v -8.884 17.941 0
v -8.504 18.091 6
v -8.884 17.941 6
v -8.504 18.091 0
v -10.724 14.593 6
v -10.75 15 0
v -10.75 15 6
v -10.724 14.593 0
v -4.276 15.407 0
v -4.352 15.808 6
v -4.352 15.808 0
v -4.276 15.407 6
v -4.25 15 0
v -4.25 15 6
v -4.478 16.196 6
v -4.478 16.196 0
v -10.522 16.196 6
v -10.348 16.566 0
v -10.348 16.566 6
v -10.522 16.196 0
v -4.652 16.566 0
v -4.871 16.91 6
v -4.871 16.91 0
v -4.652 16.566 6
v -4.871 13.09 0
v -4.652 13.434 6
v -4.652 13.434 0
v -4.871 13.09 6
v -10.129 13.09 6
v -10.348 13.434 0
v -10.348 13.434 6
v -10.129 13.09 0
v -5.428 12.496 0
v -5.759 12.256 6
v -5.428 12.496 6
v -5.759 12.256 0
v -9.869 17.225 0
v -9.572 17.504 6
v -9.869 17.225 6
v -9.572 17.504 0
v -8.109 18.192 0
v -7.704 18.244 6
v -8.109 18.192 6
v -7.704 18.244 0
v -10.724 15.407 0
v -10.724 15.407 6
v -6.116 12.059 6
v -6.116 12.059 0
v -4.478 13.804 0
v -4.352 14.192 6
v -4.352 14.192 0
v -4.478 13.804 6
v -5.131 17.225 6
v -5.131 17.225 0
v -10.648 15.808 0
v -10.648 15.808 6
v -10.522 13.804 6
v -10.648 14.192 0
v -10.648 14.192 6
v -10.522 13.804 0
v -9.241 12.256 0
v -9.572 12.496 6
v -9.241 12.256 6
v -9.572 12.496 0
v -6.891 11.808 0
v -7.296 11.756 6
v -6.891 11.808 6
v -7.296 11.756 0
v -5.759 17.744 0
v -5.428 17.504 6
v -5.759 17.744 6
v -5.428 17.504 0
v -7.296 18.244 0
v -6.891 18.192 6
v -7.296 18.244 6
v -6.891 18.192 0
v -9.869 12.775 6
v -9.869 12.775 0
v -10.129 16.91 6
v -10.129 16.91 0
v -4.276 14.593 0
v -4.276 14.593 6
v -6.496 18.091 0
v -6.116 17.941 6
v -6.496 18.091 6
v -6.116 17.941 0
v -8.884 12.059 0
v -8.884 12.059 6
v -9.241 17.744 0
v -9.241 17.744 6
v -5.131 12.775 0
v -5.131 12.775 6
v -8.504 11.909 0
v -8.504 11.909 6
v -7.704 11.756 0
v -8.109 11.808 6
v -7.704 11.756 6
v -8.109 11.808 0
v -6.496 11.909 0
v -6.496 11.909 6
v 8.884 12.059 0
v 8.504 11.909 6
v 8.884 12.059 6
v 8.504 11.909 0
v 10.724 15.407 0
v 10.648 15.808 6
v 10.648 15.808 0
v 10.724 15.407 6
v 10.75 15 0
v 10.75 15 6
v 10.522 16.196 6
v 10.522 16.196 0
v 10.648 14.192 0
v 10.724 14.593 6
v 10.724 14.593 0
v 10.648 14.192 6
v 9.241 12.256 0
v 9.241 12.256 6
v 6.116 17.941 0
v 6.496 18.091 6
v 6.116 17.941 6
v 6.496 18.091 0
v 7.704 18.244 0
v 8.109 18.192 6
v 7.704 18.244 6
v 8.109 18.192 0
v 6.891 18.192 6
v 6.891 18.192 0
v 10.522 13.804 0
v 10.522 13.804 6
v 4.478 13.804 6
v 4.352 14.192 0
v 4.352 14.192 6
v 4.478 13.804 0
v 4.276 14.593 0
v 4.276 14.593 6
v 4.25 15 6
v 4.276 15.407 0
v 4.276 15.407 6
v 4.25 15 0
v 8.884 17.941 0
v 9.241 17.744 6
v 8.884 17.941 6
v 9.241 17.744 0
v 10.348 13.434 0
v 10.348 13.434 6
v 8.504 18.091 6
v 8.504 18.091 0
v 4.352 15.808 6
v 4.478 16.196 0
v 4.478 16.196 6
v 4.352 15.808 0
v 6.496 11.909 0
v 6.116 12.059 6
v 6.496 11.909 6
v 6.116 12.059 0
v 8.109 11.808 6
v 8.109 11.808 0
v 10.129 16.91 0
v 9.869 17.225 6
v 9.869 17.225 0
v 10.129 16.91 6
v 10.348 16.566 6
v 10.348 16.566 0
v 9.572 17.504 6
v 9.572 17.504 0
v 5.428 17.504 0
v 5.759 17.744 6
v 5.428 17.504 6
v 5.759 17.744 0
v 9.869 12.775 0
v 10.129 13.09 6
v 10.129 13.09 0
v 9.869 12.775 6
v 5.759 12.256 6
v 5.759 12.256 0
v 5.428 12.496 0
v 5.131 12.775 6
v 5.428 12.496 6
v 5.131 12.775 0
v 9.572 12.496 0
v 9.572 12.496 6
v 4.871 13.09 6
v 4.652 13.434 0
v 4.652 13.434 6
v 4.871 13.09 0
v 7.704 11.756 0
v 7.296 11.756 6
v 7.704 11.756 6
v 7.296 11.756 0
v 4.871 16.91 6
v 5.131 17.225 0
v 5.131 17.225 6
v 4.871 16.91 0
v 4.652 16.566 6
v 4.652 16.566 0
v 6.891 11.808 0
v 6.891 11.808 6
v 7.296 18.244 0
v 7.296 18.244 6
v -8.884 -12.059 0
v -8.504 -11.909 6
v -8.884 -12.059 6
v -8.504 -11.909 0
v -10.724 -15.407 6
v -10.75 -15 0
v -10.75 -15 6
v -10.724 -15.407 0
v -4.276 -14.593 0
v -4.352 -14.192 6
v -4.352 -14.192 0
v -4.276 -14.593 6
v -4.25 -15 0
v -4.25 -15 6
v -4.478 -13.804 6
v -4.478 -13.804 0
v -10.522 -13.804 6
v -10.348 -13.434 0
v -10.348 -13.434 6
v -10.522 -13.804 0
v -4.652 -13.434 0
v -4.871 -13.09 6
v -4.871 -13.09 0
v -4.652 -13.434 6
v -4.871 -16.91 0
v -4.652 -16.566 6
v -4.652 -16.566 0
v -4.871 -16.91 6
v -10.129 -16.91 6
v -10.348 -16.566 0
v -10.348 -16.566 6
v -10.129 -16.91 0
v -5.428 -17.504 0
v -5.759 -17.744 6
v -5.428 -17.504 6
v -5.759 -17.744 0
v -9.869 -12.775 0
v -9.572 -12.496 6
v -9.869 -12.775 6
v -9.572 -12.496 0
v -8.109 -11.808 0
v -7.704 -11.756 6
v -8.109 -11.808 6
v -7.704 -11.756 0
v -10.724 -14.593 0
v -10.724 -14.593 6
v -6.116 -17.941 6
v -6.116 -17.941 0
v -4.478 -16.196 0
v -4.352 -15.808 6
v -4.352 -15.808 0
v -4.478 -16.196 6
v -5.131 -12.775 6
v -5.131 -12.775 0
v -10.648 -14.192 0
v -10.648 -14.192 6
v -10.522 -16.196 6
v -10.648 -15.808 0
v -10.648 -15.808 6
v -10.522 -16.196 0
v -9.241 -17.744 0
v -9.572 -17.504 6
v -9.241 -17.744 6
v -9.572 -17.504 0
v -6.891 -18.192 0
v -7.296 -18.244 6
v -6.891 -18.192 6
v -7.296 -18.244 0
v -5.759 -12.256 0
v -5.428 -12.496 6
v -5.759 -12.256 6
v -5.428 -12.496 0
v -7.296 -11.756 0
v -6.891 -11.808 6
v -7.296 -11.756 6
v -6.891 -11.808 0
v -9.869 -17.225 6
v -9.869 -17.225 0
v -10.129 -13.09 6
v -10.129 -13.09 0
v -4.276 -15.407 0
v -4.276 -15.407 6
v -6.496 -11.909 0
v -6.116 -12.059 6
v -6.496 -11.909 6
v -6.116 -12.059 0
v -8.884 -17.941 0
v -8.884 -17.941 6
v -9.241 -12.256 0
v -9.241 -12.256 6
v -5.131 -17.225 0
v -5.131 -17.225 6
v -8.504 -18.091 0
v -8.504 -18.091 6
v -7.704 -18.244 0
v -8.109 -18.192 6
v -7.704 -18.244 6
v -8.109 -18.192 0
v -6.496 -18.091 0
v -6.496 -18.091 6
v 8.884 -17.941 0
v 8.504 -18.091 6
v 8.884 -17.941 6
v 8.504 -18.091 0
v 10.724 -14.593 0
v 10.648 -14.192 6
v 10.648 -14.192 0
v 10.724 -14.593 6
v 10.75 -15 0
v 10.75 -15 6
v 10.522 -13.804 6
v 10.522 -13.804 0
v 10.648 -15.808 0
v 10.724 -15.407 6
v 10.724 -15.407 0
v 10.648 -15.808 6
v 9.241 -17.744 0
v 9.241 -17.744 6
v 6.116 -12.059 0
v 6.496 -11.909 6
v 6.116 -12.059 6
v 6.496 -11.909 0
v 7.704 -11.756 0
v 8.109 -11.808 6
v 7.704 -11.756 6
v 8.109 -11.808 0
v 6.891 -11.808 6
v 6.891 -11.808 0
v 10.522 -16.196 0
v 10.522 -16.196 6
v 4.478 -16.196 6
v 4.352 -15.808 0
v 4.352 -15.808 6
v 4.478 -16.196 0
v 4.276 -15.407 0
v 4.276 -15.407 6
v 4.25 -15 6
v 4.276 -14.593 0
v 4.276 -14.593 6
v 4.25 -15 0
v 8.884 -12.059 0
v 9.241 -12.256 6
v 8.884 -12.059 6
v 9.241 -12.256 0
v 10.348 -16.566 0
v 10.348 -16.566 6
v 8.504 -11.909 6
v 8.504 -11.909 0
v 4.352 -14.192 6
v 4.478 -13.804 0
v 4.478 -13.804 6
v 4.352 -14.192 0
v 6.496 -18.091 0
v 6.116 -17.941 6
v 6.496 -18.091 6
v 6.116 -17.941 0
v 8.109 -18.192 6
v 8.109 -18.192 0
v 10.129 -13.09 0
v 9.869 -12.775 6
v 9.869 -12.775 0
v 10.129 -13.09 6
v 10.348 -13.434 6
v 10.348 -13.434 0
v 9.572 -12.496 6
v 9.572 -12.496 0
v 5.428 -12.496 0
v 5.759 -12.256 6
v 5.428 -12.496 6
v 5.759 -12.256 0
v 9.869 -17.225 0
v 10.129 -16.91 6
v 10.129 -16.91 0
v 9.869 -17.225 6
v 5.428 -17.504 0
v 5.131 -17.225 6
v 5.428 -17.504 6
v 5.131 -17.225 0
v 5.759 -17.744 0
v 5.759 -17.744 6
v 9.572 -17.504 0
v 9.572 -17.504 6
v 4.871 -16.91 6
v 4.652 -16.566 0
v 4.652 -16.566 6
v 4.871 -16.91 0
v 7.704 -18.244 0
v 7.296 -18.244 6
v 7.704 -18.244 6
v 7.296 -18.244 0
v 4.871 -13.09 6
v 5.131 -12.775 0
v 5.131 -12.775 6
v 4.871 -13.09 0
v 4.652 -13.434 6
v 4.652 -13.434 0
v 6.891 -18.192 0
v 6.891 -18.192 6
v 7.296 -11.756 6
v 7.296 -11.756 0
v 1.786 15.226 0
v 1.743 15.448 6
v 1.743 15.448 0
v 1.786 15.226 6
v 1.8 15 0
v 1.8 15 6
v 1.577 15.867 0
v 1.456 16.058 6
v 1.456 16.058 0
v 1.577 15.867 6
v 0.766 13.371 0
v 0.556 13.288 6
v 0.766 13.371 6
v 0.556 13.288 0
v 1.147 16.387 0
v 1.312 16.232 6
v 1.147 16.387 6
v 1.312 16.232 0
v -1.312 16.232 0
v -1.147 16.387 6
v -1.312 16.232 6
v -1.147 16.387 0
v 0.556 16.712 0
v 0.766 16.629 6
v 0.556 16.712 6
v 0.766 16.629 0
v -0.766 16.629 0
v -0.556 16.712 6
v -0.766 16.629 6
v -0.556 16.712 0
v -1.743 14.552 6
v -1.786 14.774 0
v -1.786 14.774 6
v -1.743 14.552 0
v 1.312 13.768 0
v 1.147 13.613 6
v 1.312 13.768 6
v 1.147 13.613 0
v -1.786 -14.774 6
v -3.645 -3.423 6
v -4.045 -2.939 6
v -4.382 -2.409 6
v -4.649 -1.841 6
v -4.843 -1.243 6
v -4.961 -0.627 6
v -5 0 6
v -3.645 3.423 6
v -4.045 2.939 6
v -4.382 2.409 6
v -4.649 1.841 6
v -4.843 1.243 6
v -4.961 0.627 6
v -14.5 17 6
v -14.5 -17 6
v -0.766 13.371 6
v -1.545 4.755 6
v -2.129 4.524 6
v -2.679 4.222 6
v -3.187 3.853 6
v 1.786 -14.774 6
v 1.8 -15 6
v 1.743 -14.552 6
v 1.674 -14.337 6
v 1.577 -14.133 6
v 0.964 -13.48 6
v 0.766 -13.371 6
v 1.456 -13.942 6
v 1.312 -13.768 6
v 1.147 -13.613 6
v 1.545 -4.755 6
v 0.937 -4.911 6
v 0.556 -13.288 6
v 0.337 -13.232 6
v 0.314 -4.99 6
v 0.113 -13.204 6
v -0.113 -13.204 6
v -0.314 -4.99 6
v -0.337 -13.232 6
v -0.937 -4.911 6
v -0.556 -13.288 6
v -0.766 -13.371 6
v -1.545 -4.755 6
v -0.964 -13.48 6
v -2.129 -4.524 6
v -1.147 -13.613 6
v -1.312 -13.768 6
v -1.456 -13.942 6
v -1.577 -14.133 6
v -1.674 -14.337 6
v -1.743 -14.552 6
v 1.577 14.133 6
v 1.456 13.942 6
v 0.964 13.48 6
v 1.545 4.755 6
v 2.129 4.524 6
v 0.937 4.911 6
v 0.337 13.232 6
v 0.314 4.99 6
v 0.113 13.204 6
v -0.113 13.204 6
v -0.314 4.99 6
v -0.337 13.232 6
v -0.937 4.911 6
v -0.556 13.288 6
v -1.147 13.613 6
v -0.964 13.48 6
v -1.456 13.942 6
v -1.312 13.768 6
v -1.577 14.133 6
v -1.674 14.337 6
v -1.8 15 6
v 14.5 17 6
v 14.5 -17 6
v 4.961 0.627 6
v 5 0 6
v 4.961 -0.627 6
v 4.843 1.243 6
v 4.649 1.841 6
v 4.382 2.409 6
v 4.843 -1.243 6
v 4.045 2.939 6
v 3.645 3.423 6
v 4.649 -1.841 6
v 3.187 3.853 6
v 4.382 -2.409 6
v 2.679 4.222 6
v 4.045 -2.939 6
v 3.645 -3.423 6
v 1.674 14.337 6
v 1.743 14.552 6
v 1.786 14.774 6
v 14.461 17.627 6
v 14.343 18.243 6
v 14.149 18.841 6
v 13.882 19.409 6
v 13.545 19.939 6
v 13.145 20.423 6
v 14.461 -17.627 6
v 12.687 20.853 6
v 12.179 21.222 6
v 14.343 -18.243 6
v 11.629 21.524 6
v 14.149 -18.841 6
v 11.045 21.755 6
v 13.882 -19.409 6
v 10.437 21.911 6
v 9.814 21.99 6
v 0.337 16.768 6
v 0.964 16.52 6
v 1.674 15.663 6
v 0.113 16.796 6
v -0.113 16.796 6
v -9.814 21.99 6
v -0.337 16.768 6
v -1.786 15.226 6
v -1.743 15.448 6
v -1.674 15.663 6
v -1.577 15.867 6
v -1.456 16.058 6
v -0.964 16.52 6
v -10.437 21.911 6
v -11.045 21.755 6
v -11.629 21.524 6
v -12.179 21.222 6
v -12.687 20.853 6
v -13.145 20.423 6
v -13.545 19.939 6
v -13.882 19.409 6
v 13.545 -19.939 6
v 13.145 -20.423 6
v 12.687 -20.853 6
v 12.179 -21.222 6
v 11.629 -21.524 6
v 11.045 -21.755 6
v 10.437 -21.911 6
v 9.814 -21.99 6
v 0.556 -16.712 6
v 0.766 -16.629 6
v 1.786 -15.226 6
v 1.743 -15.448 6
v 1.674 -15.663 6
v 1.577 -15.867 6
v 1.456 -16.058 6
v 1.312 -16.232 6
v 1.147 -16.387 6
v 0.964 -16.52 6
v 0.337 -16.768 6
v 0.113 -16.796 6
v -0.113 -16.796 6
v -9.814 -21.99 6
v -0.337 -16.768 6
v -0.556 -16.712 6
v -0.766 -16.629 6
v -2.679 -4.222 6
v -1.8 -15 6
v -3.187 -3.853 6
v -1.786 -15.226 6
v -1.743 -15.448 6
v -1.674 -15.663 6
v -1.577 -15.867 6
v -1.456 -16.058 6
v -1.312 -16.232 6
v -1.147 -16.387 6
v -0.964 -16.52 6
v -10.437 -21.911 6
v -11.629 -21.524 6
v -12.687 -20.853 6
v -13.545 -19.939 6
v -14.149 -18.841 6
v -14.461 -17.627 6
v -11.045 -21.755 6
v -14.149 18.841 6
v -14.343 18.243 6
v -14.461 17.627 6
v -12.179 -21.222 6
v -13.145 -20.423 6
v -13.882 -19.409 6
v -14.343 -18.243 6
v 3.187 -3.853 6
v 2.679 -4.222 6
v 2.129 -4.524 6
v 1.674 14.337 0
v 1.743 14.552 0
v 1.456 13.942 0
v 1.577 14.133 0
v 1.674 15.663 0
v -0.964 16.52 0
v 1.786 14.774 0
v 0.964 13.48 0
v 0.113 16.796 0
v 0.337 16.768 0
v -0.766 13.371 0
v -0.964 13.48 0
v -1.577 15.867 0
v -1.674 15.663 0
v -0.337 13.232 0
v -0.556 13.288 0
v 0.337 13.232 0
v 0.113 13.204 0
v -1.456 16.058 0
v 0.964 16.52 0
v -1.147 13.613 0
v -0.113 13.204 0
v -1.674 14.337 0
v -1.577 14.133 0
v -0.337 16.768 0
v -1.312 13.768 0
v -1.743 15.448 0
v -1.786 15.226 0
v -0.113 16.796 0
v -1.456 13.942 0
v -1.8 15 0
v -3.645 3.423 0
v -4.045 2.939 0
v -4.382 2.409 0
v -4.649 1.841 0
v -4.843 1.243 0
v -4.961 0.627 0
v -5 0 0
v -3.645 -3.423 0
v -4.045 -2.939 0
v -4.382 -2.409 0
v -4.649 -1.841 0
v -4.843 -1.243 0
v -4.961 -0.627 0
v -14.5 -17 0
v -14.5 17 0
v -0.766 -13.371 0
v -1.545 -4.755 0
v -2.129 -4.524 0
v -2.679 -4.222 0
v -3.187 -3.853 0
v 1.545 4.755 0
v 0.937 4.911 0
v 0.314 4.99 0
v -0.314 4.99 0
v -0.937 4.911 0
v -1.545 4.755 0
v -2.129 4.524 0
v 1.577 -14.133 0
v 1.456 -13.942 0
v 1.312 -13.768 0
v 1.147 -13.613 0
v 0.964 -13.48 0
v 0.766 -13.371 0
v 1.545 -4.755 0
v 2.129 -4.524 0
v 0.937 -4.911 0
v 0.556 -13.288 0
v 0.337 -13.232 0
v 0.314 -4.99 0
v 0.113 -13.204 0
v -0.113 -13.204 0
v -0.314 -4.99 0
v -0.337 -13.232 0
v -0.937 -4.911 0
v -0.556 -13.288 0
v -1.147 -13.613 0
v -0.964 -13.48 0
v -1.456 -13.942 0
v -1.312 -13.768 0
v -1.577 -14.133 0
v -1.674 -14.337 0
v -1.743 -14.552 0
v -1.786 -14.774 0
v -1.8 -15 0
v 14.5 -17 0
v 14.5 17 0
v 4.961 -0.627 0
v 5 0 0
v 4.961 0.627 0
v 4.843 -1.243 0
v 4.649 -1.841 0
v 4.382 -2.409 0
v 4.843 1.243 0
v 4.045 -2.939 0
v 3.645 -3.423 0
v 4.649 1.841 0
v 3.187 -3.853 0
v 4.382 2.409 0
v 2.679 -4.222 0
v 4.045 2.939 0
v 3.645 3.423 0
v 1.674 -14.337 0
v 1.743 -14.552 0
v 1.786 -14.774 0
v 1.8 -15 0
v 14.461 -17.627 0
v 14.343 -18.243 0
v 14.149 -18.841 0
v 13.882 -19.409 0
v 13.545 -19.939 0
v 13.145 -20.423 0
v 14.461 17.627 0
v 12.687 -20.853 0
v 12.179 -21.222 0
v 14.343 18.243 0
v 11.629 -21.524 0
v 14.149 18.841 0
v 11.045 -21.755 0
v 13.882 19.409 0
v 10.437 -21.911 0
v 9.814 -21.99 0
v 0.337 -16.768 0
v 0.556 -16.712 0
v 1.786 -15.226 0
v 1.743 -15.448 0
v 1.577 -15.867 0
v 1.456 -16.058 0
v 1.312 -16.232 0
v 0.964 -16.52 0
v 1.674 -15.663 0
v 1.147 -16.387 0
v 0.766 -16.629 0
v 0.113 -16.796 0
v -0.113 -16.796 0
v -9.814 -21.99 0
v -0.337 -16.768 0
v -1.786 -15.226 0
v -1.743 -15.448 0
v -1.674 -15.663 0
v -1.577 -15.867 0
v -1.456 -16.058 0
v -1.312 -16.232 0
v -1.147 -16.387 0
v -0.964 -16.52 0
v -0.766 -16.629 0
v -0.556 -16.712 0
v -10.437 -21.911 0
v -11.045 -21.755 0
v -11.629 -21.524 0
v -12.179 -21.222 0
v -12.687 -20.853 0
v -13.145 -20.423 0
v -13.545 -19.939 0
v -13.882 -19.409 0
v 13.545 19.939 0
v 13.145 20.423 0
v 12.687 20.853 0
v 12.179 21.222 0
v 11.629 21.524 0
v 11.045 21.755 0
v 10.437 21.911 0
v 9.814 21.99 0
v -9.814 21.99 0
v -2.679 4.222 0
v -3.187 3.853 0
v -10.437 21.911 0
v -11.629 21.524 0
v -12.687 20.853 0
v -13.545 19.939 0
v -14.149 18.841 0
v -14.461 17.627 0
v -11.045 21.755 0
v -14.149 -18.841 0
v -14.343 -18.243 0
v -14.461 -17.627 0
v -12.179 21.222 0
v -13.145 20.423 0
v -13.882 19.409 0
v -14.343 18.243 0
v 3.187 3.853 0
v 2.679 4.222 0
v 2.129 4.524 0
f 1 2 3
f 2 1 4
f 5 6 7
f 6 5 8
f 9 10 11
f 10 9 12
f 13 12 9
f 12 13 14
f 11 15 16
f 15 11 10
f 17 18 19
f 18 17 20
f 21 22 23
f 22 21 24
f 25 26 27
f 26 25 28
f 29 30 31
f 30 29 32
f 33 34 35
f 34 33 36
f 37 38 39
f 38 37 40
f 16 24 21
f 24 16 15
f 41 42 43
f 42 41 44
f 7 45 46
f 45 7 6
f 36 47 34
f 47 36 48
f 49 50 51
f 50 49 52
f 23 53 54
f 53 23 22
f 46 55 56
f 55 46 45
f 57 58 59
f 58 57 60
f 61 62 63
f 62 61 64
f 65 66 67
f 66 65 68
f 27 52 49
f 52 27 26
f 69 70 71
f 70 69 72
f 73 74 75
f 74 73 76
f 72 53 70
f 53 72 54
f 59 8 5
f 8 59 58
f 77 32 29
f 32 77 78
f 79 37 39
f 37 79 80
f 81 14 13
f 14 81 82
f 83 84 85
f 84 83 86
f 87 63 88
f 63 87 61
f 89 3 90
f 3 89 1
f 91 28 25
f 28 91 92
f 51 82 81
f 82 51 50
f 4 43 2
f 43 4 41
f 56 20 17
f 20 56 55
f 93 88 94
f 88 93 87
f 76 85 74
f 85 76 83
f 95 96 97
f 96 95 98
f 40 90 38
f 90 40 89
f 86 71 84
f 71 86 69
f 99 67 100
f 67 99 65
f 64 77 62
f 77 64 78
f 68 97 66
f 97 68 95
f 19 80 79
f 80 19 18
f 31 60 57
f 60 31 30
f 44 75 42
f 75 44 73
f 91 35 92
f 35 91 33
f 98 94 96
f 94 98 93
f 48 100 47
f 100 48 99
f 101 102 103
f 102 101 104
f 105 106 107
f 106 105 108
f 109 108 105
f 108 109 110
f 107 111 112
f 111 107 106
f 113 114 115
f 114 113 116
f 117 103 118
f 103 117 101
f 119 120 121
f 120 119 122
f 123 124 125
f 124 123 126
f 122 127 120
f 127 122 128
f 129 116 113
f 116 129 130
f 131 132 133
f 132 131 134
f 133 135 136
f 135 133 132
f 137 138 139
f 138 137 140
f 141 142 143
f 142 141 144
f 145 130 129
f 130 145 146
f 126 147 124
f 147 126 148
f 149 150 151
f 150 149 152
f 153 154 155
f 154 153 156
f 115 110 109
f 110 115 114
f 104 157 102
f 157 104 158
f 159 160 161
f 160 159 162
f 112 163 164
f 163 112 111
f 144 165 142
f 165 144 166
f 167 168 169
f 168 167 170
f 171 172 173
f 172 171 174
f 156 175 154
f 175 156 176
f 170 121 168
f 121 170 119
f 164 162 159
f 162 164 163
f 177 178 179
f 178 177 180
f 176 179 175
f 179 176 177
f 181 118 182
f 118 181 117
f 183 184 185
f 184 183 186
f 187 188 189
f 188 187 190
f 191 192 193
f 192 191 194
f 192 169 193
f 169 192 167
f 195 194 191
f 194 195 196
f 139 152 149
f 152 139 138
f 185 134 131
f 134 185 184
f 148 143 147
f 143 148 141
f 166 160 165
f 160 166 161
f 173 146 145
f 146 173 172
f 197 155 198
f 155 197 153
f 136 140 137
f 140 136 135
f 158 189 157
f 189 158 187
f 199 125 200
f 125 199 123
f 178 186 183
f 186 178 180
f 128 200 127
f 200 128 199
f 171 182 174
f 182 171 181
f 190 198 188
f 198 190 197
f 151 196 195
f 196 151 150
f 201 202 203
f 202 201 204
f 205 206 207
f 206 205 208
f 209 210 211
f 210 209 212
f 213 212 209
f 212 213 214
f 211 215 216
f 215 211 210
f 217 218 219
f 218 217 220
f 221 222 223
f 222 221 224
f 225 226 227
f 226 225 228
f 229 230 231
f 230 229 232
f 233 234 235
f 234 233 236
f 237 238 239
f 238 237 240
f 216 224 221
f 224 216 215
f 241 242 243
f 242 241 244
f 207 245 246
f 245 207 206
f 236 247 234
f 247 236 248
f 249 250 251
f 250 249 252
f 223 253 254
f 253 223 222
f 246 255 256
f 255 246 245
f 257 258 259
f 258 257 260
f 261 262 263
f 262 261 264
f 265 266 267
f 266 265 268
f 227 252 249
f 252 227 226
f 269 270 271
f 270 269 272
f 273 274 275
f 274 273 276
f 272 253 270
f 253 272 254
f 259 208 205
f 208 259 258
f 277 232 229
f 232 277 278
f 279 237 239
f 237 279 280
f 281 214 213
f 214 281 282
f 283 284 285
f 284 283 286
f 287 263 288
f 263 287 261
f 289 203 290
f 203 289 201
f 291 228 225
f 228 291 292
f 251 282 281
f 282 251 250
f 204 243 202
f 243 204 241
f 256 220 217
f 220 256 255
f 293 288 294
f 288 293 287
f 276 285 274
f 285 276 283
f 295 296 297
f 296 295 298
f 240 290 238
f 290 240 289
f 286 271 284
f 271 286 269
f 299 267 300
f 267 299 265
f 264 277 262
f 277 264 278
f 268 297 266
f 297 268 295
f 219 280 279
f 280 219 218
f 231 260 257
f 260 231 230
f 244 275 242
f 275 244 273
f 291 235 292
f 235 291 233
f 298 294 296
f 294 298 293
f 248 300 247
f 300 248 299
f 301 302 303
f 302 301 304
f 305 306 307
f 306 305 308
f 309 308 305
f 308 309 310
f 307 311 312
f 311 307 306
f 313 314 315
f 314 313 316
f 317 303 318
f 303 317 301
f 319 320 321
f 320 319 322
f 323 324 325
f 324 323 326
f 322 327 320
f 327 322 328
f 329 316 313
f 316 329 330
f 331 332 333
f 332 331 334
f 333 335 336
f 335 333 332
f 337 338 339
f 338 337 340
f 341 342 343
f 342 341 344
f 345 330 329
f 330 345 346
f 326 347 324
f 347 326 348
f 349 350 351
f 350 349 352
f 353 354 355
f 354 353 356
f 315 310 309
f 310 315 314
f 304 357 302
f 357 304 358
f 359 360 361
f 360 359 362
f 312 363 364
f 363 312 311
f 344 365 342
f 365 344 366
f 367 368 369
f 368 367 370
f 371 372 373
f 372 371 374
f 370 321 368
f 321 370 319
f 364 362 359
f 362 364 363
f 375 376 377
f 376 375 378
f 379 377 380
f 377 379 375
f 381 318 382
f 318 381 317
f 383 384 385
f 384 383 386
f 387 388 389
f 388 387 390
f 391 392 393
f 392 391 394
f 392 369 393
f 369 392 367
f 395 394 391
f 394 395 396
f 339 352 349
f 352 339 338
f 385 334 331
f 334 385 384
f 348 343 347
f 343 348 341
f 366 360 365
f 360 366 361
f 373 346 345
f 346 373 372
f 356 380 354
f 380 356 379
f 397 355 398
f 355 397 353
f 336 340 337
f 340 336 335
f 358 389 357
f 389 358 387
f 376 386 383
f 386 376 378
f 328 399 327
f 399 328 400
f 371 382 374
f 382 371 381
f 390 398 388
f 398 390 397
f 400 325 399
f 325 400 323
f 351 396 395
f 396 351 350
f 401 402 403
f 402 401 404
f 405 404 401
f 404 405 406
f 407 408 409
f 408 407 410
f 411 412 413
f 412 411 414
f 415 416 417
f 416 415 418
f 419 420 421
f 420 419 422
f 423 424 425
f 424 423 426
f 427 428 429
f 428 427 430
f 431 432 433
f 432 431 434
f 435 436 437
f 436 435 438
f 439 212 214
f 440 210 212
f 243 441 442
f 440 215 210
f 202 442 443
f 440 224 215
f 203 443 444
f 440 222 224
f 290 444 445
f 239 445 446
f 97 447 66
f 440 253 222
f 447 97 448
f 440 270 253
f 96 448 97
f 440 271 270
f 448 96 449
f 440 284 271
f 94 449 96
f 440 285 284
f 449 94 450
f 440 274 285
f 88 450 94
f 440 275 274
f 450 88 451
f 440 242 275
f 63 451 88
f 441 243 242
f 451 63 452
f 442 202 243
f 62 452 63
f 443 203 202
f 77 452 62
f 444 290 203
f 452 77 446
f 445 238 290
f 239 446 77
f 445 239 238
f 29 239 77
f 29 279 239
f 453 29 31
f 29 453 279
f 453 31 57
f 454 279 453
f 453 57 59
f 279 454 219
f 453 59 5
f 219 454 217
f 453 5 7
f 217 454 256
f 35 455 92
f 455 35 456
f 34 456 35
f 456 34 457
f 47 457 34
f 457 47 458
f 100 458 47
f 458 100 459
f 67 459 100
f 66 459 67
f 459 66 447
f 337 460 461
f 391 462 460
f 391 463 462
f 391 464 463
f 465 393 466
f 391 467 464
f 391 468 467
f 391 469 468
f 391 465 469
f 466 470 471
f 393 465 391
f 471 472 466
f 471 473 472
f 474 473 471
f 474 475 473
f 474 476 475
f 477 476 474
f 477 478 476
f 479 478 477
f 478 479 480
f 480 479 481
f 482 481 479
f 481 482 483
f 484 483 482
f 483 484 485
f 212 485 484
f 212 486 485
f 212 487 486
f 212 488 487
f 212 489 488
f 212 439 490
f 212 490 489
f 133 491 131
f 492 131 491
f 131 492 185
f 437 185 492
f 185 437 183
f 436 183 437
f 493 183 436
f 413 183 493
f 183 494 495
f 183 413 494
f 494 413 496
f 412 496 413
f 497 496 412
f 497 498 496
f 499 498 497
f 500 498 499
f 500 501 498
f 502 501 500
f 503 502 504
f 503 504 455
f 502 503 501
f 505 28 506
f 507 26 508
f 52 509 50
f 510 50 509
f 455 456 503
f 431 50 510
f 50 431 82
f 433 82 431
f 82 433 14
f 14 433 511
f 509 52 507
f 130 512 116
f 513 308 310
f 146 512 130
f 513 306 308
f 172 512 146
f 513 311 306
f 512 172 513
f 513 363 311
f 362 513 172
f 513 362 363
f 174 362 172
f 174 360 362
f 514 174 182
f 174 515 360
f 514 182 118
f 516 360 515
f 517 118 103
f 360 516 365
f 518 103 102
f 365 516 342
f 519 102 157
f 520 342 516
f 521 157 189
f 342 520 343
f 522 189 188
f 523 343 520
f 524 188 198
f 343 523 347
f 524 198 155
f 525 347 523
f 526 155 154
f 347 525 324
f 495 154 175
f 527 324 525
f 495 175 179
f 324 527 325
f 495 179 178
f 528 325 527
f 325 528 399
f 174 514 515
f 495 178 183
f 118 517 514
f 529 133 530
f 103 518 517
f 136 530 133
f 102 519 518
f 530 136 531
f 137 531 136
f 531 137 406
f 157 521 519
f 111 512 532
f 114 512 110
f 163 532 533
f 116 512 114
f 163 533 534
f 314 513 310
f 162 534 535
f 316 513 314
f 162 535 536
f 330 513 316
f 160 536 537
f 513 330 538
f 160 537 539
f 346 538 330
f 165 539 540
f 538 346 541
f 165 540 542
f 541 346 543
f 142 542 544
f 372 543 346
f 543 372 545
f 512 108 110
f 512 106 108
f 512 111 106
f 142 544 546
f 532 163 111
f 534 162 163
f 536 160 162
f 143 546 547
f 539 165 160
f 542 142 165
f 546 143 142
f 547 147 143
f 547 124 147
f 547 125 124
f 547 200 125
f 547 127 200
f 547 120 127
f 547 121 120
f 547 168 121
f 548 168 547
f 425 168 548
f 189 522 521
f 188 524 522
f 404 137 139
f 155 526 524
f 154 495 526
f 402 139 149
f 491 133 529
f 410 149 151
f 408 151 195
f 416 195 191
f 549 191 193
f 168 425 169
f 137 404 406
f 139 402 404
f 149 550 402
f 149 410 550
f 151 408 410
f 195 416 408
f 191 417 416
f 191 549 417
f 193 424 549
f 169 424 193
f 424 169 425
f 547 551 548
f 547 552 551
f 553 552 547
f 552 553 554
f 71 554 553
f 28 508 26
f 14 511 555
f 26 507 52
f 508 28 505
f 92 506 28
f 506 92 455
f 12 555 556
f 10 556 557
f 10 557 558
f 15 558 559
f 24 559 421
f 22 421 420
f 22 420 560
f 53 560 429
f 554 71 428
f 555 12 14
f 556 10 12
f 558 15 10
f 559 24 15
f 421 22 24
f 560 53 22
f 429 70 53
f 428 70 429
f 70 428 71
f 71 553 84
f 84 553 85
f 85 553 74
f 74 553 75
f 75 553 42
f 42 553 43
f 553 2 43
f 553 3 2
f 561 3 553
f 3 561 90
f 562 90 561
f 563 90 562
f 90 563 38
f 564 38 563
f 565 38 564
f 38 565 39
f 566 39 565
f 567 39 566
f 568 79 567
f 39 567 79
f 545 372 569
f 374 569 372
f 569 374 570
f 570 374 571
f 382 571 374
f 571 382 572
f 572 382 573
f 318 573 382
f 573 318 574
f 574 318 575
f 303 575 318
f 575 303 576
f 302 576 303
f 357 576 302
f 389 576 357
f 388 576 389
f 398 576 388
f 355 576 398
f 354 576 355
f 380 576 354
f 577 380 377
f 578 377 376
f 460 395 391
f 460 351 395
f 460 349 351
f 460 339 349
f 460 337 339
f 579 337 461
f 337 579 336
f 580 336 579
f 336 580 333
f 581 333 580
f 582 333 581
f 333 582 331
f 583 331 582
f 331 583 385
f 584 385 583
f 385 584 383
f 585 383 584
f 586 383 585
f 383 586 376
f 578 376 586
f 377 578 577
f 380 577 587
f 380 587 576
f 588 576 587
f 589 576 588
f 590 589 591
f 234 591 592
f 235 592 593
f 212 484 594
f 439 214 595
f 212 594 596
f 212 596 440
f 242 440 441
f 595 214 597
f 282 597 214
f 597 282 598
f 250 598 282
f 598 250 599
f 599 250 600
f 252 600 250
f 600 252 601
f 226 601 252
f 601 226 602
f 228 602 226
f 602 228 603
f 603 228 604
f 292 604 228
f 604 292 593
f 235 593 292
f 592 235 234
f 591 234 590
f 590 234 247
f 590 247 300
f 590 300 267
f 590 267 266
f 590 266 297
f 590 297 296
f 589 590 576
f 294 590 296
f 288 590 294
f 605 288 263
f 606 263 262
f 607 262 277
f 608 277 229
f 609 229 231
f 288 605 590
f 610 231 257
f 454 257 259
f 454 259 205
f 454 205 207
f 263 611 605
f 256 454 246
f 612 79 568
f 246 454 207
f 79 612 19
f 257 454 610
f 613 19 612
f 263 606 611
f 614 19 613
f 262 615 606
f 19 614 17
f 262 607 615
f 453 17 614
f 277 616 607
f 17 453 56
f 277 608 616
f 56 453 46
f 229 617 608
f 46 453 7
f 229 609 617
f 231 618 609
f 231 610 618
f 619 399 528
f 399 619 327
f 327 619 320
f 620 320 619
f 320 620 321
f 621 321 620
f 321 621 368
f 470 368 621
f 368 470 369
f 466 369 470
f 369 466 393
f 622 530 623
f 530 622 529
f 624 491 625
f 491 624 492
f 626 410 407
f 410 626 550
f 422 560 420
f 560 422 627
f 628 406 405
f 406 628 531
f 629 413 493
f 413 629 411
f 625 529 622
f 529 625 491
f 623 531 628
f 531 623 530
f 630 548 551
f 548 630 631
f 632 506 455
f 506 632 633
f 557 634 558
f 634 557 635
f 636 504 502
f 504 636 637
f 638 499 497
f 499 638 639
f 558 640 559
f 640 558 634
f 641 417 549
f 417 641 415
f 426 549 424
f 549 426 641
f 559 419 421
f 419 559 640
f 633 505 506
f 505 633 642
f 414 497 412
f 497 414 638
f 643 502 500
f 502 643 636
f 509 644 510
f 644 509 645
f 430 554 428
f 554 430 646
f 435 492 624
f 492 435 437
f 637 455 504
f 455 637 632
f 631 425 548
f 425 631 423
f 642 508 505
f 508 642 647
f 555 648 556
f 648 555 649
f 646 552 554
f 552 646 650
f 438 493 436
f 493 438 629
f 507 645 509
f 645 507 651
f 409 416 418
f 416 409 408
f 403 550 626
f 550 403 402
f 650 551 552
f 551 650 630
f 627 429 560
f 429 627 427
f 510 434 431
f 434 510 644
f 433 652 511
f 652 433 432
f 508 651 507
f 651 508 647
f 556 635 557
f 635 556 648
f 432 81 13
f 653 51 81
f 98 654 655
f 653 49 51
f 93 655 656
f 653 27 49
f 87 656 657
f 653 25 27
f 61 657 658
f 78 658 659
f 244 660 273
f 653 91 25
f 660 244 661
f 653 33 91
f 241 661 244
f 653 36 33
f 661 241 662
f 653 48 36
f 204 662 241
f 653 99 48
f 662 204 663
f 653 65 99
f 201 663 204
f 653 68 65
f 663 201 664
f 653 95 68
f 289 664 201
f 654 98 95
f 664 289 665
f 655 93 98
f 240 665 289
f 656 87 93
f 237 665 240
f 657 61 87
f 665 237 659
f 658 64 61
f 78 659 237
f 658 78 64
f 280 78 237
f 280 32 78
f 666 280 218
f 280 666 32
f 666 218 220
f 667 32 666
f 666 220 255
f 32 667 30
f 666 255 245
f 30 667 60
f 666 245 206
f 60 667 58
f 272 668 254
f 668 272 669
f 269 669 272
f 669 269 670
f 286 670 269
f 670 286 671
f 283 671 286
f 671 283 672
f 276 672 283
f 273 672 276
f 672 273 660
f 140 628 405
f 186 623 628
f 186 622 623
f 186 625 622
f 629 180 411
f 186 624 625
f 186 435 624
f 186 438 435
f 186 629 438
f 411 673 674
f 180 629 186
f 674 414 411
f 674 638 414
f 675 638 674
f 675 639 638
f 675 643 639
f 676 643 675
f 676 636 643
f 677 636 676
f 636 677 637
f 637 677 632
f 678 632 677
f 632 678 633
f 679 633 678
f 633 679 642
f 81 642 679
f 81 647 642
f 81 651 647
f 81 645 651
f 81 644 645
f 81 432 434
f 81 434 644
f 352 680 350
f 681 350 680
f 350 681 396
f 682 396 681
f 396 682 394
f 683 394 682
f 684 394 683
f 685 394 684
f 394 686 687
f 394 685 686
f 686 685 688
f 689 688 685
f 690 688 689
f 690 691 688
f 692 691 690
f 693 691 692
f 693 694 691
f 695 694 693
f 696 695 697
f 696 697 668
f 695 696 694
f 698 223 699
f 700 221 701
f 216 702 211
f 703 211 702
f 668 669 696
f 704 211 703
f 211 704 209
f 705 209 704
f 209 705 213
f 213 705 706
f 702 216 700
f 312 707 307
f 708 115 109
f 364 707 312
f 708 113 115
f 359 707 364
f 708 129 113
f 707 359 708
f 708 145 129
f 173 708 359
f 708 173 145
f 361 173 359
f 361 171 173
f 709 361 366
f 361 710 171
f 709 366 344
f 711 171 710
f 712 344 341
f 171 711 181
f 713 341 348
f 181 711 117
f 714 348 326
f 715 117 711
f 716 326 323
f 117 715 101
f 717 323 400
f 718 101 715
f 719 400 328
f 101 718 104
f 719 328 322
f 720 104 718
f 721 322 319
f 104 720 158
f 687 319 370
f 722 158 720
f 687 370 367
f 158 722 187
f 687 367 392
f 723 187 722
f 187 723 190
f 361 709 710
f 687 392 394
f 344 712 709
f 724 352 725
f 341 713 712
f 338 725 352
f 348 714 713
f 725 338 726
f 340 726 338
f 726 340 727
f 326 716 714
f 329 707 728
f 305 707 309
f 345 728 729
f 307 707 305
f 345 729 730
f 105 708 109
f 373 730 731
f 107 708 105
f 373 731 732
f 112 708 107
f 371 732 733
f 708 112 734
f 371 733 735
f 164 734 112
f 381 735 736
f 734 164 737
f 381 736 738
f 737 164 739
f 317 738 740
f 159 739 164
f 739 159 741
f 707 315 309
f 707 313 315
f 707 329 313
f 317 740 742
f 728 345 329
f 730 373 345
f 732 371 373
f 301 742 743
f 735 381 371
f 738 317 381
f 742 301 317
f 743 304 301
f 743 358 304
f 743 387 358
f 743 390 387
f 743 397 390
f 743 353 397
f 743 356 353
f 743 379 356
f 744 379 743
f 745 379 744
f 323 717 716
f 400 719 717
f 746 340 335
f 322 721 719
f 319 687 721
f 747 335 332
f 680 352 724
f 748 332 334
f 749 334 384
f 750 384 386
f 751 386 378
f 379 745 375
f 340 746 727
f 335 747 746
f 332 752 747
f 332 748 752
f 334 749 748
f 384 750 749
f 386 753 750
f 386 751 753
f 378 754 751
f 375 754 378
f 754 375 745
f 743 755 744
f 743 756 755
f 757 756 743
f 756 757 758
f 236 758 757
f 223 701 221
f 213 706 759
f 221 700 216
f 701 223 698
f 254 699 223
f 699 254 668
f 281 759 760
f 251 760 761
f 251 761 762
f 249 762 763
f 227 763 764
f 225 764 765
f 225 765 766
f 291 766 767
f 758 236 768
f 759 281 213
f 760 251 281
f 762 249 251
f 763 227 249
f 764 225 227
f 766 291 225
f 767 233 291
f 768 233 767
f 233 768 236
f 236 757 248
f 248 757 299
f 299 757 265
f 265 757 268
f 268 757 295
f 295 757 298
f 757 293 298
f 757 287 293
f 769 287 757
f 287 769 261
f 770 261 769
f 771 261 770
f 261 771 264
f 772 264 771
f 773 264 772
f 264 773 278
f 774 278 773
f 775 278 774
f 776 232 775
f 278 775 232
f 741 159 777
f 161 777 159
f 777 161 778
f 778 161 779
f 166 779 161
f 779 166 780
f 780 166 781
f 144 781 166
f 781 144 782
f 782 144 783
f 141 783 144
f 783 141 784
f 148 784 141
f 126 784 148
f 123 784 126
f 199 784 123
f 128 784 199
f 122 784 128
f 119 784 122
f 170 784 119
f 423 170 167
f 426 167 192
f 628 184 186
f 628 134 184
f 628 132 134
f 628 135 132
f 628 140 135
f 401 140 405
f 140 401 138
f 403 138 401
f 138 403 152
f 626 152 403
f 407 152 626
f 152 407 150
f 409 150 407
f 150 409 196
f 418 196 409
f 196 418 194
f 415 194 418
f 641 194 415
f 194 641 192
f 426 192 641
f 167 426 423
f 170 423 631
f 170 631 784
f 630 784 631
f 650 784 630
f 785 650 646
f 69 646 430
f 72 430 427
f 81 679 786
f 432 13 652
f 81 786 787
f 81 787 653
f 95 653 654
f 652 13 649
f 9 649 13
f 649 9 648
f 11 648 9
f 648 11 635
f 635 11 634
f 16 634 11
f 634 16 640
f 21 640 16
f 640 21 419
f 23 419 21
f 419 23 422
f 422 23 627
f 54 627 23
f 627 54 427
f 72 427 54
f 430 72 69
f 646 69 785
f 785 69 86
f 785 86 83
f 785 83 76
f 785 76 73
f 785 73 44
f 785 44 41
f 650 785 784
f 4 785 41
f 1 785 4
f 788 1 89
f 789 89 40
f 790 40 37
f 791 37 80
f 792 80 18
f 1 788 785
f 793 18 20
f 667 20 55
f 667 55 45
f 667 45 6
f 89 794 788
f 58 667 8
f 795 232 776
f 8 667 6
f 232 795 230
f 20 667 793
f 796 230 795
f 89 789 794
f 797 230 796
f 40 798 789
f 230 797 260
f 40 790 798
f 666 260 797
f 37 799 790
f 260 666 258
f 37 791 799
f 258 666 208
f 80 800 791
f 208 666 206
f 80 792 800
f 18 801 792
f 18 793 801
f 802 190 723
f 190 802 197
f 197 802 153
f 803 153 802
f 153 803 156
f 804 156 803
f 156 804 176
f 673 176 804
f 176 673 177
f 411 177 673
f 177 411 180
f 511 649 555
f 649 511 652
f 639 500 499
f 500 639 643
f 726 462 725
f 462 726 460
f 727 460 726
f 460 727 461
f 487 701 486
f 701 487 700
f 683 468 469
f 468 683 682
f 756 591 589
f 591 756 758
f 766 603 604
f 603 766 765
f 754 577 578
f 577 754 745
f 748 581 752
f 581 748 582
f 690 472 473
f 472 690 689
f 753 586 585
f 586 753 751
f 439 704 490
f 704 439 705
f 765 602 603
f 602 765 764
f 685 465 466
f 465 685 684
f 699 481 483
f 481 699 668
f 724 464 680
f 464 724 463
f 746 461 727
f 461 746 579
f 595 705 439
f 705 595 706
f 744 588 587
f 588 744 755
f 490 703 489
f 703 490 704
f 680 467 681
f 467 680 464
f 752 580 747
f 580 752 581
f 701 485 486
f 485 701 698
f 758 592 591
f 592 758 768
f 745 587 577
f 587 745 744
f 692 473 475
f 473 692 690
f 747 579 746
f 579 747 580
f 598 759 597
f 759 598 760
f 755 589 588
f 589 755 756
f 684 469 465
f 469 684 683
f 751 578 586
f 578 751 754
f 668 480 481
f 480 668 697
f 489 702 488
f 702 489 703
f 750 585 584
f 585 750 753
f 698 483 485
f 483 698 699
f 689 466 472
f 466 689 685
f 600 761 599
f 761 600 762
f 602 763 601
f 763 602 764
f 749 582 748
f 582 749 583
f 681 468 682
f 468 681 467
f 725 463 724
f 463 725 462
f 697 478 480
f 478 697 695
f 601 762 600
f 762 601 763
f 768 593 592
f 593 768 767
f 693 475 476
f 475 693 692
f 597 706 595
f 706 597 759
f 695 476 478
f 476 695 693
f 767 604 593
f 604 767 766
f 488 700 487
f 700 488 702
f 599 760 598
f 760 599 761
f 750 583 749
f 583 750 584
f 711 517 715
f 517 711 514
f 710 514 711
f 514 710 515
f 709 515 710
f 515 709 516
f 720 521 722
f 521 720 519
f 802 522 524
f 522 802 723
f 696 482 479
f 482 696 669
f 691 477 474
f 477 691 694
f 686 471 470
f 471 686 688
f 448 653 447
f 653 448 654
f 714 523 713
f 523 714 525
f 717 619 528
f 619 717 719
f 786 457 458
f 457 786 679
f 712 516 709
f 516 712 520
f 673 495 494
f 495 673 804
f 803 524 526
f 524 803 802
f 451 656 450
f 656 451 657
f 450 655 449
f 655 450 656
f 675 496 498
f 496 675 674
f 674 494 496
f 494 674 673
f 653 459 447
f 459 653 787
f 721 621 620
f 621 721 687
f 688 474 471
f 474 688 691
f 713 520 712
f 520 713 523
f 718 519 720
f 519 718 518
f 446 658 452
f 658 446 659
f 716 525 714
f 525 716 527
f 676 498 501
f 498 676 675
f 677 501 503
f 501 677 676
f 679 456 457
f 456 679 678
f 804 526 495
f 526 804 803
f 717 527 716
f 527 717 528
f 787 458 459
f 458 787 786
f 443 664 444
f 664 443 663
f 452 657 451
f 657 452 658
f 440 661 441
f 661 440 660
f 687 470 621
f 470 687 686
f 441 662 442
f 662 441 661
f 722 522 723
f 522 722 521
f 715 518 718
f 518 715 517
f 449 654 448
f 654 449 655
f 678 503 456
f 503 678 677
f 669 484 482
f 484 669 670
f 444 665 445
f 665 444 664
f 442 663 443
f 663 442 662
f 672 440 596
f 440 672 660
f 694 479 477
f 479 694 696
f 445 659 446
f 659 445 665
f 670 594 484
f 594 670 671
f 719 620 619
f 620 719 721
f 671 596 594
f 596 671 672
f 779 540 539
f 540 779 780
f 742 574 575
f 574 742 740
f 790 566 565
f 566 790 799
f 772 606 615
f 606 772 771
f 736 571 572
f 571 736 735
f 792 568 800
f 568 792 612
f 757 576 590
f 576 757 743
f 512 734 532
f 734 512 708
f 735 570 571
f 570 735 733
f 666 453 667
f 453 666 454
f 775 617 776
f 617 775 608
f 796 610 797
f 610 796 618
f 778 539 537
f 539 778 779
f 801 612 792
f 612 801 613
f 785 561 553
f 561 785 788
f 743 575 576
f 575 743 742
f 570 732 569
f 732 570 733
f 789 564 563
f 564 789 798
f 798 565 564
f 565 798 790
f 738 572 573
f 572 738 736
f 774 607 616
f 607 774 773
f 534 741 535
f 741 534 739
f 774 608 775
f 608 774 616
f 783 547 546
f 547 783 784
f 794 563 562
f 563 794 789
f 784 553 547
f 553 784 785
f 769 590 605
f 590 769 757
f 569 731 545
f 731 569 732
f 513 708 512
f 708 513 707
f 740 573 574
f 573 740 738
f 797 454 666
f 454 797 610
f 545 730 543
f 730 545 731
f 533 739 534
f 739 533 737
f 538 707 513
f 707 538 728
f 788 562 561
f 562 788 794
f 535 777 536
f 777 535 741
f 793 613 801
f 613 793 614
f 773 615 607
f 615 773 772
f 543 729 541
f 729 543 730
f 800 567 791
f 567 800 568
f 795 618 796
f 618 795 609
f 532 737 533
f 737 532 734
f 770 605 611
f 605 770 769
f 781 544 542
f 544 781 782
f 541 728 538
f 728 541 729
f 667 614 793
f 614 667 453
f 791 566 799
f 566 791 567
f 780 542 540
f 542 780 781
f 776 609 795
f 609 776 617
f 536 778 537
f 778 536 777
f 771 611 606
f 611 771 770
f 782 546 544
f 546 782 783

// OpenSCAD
$fn = 50;


difference() {
	union() {
		hull() {
			translate(v = [-9.5000000000, 17.0000000000, 0]) {
				cylinder(h = 6, r = 5);
			}
			translate(v = [9.5000000000, 17.0000000000, 0]) {
				cylinder(h = 6, r = 5);
			}
			translate(v = [-9.5000000000, -17.0000000000, 0]) {
				cylinder(h = 6, r = 5);
			}
			translate(v = [9.5000000000, -17.0000000000, 0]) {
				cylinder(h = 6, r = 5);
			}
		}
	}
	union() {
		#translate(v = [-7.5000000000, 15.0000000000, 0]) {
			cylinder(h = 6, r = 3.2500000000);
		}
		#translate(v = [7.5000000000, 15.0000000000, 0]) {
			cylinder(h = 6, r = 3.2500000000);
		}
		#translate(v = [-7.5000000000, -15.0000000000, 0]) {
			cylinder(h = 6, r = 3.2500000000);
		}
		#translate(v = [7.5000000000, -15.0000000000, 0]) {
			cylinder(h = 6, r = 3.2500000000);
		}
		#translate(v = [-7.5000000000, -15.0000000000, -100.0000000000]) {
			cylinder(h = 200, r = 3.2500000000);
		}
		#translate(v = [-7.5000000000, 15.0000000000, -100.0000000000]) {
			cylinder(h = 200, r = 3.2500000000);
		}
		#translate(v = [7.5000000000, -15.0000000000, -100.0000000000]) {
			cylinder(h = 200, r = 3.2500000000);
		}
		#translate(v = [7.5000000000, 15.0000000000, -100.0000000000]) {
			cylinder(h = 200, r = 3.2500000000);
		}
		#translate(v = [-7.5000000000, 15.0000000000, 0]) {
			cylinder(h = 6, r = 1.8000000000);
		}
		#translate(v = [0.0000000000, 15.0000000000, 0]) {
			cylinder(h = 6, r = 1.8000000000);
		}
		#translate(v = [7.5000000000, 15.0000000000, 0]) {
			cylinder(h = 6, r = 1.8000000000);
		}
		#translate(v = [-7.5000000000, -15.0000000000, 0]) {
			cylinder(h = 6, r = 1.8000000000);
		}
		#translate(v = [0.0000000000, -15.0000000000, 0]) {
			cylinder(h = 6, r = 1.8000000000);
		}
		#translate(v = [7.5000000000, -15.0000000000, 0]) {
			cylinder(h = 6, r = 1.8000000000);
		}
		#translate(v = [-7.5000000000, 15.0000000000, 0]) {
			cylinder(h = 6, r = 1.8000000000);
		}
		#translate(v = [0.0000000000, 15.0000000000, 0]) {
			cylinder(h = 6, r = 1.8000000000);
		}
		#translate(v = [7.5000000000, 15.0000000000, 0]) {
			cylinder(h = 6, r = 1.8000000000);
		}
		#translate(v = [-7.5000000000, -15.0000000000, 0]) {
			cylinder(h = 6, r = 1.8000000000);
		}
		#translate(v = [0.0000000000, -15.0000000000, 0]) {
			cylinder(h = 6, r = 1.8000000000);
		}
		#translate(v = [7.5000000000, -15.0000000000, 0]) {
			cylinder(h = 6, r = 1.8000000000);
		}
		#translate(v = [-7.5000000000, 15.0000000000, 0]) {
			cylinder(h = 6, r = 1.8000000000);
		}
		#translate(v = [0.0000000000, 15.0000000000, 0]) {
			cylinder(h = 6, r = 1.8000000000);
		}
		#translate(v = [7.5000000000, 15.0000000000, 0]) {
			cylinder(h = 6, r = 1.8000000000);
		}
		#translate(v = [-7.5000000000, -15.0000000000, 0]) {
			cylinder(h = 6, r = 1.8000000000);
		}
		#translate(v = [0.0000000000, -15.0000000000, 0]) {
			cylinder(h = 6, r = 1.8000000000);
		}
		#translate(v = [7.5000000000, -15.0000000000, 0]) {
			cylinder(h = 6, r = 1.8000000000);
		}
		#cylinder(h = 6, r = 5.0000000000);
	}
}
